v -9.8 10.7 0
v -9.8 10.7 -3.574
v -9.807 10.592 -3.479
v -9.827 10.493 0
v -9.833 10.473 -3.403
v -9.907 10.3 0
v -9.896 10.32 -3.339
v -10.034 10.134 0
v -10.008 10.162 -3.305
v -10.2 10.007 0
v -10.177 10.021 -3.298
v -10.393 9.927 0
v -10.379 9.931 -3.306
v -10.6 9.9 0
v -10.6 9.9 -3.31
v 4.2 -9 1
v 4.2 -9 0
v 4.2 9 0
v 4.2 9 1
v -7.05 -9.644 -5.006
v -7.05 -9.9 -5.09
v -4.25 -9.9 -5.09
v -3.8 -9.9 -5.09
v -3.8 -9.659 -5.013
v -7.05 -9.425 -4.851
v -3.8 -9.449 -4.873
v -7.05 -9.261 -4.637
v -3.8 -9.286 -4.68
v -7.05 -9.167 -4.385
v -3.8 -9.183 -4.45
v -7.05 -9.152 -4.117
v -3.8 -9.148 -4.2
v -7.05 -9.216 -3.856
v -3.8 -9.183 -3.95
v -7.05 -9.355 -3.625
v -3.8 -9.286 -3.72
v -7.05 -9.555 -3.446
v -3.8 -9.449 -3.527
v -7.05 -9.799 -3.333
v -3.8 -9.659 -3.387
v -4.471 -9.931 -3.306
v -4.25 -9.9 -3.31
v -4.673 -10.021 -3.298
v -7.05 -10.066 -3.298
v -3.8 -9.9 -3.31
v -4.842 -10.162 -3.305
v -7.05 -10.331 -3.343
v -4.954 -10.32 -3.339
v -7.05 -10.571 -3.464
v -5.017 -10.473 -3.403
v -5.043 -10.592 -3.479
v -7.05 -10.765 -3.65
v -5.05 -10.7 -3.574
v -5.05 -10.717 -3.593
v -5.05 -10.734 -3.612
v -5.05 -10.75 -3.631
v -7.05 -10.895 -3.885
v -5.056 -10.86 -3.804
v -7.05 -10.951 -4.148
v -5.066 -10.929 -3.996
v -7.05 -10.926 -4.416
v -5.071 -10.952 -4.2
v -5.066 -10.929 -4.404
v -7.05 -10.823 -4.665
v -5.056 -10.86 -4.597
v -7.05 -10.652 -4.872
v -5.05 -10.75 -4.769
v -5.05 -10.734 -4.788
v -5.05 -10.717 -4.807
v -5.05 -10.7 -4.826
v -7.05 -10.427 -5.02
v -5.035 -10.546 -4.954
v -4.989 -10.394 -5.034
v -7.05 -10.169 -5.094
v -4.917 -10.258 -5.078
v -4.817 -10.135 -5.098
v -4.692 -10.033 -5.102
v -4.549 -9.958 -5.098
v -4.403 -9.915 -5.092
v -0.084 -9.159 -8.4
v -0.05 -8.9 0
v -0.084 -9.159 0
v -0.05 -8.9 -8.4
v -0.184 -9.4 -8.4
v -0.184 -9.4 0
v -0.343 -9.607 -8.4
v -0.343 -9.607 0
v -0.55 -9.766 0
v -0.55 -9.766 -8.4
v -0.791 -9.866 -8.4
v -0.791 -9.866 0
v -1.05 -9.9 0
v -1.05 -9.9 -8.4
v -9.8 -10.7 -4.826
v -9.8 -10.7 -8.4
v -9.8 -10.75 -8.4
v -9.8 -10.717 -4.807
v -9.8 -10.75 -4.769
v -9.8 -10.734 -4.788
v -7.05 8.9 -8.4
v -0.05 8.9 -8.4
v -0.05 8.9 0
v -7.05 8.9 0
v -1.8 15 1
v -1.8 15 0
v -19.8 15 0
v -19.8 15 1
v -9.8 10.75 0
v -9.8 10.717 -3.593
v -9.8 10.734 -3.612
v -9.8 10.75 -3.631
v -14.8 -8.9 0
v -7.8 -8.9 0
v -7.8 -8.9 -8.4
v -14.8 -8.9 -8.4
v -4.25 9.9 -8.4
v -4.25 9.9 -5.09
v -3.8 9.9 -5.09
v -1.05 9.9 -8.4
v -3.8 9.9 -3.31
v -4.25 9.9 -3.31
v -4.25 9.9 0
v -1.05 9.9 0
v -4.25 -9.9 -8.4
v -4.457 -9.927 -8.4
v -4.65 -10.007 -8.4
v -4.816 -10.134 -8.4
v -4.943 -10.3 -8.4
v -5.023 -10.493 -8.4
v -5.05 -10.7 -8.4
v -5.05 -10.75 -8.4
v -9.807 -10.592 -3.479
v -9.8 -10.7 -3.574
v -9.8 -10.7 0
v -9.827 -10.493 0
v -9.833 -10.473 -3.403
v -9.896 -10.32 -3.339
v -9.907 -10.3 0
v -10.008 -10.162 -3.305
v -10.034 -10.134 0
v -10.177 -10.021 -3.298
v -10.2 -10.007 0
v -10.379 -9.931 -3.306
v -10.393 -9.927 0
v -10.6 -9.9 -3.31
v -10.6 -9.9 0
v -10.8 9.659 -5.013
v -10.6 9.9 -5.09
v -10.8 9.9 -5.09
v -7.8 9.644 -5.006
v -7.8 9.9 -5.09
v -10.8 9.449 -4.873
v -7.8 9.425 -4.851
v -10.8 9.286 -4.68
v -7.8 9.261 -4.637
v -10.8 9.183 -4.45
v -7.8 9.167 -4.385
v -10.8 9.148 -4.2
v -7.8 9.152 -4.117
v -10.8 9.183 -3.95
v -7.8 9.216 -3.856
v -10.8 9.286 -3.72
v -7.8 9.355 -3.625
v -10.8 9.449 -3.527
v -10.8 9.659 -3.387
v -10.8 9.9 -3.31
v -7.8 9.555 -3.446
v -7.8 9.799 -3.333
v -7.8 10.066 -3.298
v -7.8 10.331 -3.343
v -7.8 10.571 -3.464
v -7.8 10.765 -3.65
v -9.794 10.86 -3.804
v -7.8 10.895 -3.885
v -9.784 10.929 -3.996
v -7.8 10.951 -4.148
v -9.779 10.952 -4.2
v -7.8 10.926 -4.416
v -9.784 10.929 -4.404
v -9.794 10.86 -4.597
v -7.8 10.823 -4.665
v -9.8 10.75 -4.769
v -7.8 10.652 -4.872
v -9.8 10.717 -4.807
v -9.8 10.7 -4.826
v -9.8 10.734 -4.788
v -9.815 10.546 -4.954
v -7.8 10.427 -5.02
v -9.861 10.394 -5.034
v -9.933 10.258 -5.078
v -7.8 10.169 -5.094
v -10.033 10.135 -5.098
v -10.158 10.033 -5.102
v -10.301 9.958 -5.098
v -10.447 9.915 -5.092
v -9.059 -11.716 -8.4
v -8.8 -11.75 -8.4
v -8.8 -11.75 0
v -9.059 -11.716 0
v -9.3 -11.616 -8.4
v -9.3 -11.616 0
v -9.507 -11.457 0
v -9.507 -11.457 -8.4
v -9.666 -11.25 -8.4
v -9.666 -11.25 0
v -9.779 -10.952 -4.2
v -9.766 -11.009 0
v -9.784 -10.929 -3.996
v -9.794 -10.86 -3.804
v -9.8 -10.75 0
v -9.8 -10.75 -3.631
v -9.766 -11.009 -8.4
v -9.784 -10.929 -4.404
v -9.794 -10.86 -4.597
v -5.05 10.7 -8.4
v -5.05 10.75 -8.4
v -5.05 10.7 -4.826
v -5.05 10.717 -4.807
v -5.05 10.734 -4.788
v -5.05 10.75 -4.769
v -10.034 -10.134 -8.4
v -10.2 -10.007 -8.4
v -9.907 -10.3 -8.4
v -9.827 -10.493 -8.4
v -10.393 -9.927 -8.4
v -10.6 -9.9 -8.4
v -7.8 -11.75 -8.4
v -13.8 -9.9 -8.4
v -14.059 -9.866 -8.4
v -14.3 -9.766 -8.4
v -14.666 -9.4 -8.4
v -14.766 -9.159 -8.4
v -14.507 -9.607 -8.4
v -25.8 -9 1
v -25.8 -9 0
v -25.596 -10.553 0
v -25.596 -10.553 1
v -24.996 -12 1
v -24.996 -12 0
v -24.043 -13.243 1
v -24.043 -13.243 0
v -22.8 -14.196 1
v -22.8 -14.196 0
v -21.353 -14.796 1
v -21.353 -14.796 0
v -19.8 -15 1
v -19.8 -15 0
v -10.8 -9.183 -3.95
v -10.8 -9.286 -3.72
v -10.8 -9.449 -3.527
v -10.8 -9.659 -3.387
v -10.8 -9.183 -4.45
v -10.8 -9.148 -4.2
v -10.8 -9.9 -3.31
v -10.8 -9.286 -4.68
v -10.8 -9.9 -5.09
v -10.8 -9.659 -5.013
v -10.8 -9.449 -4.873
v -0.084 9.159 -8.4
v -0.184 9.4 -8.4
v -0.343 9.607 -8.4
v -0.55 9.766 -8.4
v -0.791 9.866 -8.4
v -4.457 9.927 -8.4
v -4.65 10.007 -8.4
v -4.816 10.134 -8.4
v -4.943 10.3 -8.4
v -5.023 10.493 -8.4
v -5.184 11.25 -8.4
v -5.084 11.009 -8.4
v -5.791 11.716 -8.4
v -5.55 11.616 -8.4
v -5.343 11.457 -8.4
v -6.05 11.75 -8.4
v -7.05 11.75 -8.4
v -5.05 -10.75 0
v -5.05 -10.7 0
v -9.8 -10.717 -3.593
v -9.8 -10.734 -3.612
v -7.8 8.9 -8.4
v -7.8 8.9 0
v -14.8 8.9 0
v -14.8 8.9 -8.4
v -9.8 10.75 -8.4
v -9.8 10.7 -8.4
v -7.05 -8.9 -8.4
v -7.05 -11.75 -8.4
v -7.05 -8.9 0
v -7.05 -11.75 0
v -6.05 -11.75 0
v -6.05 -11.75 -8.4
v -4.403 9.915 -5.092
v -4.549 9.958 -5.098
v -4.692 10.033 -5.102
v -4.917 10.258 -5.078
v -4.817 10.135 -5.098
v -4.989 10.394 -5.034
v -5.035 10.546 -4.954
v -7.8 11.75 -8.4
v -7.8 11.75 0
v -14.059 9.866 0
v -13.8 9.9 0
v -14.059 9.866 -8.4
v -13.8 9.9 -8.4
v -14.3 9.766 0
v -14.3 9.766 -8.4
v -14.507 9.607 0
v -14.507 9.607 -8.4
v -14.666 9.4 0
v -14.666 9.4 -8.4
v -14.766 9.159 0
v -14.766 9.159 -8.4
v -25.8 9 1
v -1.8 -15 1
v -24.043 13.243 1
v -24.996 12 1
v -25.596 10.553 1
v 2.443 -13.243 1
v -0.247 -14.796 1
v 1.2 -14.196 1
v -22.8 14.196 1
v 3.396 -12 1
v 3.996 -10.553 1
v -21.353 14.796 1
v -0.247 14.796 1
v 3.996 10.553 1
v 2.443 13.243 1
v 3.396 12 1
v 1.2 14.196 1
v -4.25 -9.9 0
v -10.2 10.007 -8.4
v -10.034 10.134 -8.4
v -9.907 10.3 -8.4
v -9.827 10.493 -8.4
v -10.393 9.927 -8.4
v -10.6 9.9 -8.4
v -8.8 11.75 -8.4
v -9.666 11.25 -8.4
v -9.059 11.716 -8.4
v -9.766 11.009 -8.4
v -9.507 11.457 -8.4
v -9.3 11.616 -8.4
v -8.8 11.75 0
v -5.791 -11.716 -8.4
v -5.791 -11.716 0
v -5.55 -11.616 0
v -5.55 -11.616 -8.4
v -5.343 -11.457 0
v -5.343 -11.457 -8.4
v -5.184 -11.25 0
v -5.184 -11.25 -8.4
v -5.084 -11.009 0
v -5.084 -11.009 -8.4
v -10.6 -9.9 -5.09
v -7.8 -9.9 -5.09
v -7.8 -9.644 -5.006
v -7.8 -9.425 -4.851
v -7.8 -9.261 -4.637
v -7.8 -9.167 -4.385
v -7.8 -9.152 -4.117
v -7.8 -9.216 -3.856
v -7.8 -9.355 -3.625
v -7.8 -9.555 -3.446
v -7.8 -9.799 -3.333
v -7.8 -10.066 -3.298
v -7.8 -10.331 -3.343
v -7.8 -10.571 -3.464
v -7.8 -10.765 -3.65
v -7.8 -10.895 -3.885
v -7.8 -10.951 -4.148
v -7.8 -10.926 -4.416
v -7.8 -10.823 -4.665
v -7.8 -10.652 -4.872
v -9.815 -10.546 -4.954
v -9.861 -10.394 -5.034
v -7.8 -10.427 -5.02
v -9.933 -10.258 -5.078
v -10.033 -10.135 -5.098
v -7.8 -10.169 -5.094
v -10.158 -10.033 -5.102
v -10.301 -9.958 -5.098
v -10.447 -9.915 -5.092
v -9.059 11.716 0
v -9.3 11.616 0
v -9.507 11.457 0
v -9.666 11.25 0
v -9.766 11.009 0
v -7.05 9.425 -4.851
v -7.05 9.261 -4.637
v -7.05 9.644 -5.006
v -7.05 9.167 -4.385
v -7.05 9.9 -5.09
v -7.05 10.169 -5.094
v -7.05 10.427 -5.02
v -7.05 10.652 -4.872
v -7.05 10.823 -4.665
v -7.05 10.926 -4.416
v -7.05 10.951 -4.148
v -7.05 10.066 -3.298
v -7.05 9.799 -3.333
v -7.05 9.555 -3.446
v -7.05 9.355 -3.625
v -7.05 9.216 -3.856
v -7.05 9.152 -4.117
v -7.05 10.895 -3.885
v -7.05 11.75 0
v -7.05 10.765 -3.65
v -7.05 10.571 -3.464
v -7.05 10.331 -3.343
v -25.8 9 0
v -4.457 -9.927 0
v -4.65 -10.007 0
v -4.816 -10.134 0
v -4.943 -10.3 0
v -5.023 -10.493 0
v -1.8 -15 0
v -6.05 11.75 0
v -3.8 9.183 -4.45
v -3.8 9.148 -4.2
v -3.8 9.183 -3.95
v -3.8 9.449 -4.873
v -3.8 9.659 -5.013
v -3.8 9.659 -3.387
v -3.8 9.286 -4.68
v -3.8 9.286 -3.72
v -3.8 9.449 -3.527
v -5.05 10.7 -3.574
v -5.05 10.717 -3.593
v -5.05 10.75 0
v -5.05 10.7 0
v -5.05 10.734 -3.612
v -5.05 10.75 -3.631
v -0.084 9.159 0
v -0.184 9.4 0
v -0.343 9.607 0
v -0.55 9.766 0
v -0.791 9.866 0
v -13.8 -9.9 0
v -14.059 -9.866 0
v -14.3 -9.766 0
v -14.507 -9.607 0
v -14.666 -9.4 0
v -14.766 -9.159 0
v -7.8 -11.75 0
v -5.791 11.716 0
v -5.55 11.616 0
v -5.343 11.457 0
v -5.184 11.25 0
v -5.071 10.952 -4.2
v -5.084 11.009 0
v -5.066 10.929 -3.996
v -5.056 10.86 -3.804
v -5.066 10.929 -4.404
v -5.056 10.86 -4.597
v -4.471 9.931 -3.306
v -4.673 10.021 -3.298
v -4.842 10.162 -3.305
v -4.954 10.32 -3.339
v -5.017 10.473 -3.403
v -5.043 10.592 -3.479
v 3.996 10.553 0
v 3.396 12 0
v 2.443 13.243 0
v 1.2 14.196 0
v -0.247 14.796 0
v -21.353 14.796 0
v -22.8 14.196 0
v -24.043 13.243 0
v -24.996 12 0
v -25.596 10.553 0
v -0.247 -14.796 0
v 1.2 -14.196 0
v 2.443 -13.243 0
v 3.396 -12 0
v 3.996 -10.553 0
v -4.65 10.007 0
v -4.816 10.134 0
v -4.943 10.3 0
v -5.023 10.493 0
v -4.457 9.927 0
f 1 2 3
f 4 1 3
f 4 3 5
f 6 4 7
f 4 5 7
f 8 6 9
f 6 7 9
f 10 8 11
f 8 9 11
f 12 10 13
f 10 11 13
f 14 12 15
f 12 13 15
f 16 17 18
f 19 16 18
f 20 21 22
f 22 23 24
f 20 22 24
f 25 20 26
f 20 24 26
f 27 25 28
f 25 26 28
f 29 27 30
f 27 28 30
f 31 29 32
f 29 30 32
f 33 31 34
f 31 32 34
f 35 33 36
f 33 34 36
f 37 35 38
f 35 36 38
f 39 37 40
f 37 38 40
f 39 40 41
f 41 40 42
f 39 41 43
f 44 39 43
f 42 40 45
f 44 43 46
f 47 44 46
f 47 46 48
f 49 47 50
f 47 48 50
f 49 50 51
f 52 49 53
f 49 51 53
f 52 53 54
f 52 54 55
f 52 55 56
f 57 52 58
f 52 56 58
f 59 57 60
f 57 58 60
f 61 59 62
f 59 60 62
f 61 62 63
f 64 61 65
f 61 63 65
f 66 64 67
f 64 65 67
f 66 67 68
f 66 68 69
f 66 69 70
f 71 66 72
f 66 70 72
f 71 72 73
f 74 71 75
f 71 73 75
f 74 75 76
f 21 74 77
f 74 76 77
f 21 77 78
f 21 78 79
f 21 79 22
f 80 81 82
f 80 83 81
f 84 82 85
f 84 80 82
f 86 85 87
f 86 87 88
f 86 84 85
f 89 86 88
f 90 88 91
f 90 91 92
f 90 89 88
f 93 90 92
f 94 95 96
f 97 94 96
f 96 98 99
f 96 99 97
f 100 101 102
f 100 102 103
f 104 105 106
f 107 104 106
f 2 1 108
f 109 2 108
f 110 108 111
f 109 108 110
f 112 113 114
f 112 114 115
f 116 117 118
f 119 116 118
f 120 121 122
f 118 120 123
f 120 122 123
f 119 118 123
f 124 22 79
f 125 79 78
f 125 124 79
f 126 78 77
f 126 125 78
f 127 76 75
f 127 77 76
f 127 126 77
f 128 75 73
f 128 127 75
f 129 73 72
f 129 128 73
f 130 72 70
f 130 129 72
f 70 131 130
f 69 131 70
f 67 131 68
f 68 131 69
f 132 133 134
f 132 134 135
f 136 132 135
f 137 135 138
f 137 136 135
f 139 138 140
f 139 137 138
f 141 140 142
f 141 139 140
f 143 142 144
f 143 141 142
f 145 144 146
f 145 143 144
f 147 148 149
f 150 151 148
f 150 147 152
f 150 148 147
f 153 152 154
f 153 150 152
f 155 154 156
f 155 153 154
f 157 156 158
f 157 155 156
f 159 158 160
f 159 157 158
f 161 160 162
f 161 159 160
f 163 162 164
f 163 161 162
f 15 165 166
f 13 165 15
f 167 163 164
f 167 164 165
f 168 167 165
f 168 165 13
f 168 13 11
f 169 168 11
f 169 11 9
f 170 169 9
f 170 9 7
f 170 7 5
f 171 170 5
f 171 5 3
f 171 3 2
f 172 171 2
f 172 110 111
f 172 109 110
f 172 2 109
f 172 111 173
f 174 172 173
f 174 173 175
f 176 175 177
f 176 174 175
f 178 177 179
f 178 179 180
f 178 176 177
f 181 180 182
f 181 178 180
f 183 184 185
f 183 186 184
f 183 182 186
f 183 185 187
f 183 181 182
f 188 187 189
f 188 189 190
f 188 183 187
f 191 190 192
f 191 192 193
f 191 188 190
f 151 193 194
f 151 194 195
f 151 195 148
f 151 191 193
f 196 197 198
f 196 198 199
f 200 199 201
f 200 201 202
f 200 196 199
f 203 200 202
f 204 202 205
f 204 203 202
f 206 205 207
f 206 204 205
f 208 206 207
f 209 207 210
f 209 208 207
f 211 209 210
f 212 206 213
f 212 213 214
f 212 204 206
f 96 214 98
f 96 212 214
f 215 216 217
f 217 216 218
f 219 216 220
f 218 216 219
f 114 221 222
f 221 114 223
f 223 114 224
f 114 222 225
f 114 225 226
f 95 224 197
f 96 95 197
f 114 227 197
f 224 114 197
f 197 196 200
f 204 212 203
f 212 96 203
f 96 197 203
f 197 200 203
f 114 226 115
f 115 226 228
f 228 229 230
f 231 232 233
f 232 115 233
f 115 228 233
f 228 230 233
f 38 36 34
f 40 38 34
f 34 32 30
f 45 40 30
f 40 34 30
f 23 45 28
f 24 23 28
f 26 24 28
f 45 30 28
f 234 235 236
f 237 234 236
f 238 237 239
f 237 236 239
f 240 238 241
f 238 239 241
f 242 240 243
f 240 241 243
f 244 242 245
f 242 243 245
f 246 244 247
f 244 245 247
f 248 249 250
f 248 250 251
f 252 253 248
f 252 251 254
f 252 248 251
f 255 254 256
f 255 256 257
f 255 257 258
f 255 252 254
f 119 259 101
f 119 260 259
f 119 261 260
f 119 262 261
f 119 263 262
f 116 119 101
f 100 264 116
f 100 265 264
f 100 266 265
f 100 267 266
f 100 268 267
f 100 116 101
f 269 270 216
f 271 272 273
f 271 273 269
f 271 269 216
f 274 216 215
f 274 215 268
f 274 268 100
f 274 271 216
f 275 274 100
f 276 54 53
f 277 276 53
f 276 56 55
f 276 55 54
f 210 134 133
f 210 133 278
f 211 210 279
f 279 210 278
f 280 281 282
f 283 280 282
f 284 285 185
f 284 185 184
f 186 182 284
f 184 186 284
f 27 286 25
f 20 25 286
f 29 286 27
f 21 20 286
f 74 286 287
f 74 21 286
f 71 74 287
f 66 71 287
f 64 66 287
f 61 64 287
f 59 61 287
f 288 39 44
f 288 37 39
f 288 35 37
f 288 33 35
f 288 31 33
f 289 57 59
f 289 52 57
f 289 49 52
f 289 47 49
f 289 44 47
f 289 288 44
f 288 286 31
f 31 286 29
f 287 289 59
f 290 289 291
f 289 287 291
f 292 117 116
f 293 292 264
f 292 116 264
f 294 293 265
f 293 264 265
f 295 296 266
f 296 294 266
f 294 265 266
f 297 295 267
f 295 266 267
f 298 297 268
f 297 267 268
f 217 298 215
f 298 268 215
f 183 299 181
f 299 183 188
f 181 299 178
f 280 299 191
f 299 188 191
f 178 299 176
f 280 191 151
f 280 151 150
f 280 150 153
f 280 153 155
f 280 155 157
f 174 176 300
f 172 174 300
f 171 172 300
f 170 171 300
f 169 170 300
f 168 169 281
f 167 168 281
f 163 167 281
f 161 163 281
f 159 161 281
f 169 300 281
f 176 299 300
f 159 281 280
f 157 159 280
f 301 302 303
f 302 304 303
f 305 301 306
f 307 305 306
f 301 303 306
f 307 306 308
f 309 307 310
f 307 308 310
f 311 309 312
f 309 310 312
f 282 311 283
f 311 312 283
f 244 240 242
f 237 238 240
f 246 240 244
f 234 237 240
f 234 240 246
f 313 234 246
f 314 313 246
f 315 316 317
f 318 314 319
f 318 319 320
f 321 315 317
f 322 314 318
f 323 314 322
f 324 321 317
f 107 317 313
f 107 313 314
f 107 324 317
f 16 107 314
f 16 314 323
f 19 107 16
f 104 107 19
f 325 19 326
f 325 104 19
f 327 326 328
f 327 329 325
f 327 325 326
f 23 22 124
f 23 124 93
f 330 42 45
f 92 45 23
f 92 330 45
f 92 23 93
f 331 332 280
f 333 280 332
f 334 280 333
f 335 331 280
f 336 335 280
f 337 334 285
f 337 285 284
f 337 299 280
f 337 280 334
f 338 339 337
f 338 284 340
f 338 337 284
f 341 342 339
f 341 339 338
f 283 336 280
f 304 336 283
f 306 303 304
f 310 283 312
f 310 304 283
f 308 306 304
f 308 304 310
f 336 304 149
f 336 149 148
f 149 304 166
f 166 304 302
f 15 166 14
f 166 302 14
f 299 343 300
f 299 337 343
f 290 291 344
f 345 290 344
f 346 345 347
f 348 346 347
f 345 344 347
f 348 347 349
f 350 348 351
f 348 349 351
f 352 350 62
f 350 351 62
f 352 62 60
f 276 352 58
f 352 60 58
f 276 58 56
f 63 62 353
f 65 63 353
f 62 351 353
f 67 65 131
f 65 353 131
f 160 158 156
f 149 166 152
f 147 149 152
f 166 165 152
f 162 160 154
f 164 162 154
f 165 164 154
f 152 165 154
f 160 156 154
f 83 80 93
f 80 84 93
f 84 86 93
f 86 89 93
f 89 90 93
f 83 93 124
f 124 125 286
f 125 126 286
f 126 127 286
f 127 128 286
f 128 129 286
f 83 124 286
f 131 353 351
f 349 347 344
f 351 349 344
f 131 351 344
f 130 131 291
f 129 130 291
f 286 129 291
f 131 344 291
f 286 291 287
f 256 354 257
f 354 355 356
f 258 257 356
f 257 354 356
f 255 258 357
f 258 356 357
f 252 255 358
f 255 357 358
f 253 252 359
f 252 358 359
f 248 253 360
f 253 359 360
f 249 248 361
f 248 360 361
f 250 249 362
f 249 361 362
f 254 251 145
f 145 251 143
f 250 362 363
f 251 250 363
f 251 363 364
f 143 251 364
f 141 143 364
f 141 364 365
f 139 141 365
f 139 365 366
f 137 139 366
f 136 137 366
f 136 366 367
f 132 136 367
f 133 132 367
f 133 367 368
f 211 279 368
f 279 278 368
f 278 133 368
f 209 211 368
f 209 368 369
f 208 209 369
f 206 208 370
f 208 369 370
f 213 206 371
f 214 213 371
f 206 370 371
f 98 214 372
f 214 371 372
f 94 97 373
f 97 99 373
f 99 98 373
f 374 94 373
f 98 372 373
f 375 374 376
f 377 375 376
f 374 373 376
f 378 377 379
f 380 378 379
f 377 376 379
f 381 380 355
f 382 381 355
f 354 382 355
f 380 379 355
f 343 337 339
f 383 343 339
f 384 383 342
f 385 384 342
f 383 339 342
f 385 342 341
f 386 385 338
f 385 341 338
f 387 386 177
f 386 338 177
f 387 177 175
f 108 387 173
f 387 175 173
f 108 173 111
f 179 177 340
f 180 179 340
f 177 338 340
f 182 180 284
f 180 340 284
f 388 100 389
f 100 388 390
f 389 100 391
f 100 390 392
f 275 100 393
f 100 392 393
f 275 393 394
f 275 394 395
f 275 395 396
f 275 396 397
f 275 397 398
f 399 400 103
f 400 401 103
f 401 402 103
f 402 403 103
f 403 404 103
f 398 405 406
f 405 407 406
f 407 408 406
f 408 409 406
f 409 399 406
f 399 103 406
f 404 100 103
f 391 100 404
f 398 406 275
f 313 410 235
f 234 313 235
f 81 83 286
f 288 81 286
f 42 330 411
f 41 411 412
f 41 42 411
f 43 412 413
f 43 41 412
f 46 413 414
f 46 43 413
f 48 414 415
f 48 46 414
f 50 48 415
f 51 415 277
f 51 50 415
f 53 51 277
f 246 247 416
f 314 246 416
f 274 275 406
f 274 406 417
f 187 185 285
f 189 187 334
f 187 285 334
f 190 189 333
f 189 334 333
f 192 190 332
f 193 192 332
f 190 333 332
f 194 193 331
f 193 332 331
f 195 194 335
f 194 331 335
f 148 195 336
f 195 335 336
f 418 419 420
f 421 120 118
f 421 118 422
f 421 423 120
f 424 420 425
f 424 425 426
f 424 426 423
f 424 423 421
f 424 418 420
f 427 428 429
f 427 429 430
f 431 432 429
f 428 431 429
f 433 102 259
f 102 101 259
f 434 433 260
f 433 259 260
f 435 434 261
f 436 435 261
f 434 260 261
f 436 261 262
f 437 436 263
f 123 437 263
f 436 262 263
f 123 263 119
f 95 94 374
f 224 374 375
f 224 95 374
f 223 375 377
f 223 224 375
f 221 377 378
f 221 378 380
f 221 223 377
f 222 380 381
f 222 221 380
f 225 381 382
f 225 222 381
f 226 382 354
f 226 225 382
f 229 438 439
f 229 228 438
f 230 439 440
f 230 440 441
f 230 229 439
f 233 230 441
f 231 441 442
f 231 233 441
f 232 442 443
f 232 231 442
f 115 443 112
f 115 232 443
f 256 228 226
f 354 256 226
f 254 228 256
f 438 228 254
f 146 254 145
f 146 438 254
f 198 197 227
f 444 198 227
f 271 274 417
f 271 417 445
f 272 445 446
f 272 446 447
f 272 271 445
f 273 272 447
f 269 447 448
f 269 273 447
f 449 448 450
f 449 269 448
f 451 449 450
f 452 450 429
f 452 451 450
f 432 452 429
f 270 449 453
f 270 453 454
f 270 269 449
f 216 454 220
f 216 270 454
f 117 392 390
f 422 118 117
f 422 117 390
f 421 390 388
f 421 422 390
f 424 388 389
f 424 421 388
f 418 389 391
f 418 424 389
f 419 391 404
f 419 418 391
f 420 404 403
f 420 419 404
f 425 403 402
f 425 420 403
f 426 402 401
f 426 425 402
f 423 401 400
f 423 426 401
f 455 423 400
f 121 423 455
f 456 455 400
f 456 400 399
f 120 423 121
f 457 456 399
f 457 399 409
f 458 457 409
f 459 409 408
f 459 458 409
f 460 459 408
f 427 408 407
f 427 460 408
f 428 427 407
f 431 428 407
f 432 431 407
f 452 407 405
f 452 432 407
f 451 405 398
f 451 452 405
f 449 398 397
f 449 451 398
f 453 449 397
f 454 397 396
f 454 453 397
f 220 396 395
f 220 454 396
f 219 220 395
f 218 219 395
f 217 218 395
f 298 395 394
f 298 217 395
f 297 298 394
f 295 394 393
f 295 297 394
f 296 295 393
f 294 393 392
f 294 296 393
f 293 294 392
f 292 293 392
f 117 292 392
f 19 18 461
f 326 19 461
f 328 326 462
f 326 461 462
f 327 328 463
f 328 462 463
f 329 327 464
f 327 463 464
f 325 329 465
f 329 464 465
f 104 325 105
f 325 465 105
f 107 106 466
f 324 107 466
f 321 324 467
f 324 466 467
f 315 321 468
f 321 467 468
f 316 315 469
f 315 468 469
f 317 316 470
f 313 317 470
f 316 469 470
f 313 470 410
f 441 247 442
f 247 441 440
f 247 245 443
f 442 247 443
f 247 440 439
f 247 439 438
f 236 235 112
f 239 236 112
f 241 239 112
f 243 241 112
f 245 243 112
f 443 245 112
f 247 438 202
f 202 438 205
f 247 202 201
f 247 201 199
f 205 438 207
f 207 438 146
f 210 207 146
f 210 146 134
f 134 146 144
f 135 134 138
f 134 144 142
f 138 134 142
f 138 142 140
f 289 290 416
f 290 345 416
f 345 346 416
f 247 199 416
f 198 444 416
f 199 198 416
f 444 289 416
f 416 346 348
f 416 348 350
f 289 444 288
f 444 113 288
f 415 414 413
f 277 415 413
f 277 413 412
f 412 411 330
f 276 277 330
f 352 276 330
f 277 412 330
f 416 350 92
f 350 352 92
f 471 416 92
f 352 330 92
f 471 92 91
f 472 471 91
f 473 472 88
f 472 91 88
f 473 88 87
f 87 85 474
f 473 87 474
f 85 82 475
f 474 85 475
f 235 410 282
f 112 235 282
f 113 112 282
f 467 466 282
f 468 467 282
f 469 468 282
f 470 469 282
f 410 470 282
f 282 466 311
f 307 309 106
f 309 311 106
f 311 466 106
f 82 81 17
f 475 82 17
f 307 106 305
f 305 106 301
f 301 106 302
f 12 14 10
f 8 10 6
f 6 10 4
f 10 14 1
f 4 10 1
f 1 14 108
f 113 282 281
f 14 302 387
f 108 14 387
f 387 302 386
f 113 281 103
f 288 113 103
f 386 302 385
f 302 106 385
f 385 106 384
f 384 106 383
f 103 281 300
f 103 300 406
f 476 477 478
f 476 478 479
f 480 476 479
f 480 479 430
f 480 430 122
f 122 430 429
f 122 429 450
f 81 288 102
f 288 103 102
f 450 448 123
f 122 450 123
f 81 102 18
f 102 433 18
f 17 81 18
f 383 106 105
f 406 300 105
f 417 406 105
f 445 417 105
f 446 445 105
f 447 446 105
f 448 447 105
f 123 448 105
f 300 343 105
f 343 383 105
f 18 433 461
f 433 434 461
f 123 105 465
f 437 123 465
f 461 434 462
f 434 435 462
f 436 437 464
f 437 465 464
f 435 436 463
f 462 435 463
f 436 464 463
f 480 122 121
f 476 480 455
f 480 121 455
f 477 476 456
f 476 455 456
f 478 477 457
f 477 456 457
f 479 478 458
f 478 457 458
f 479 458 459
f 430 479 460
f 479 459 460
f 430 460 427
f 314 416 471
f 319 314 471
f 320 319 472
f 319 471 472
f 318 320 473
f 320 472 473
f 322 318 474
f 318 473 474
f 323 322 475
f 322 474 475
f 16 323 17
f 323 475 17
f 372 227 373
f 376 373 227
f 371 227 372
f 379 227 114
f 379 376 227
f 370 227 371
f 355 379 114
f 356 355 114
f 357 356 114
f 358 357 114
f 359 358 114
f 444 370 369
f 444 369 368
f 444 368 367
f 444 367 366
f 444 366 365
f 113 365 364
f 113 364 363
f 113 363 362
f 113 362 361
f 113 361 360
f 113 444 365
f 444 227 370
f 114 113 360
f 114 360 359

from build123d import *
from OCP.BRepFilletAPI import BRepFilletAPI_MakeFillet

# Parameters (mm, degrees)
SKETCH1_W           = 8.4
SKETCH1_H           = 23.5
BOSS_EXTRUDE1_DEPTH = 1
SKETCH1_3_W         = 11.6
SKETCH1_3_H         = 23.5
BOSS_EXTRUDE4_DEPTH = 1
BOSS_EXTRUDE5_START = -1
BOSS_EXTRUDE5_DEPTH = 9.4
FILLET2_R           = 1
FILLET2_R_2         = 0.8
FILLET3_R           = 5
CUT_EXTRUDE1_START  = -6
SKETCH4_R           = 0.902238409
CUT_EXTRUDE1_DEPTH  = 7
BOSS_EXTRUDE8_DEPTH = 1


# Read off the part's stored shape, not the designer's step: Mirror1
with BuildPart() as part:
    # Sketch1 → Boss-Extrude1 (new body)
    with BuildSketch(Plane.XY):
        Rectangle(SKETCH1_W, SKETCH1_H)
    extrude(amount=BOSS_EXTRUDE1_DEPTH)

    # Sketch1<3> → Boss-Extrude4 (add)
    with BuildSketch(Plane.XY):
        with Locations((-10, 0)):
            Rectangle(SKETCH1_3_W, SKETCH1_3_H)
    extrude(amount=BOSS_EXTRUDE4_DEPTH)

    # Sketch3 → Boss-Extrude5 (add)
    with BuildSketch(Plane(origin=(0, 0, 0), x_dir=(-1, 0, 0), z_dir=(0, 0, -1)).offset(BOSS_EXTRUDE5_START)):
        Polygon((0.05, 8.9), (7.05, 8.9), (7.05, 11.75), (5.05, 11.75), (5.05, 9.9), (0.05, 9.9), align=None)
        Polygon((7.8, 11.75), (7.8, 8.9), (14.8, 8.9), (14.8, 9.9), (9.8, 9.9), (9.8, 11.75), align=None)
    extrude(amount=BOSS_EXTRUDE5_DEPTH)

    # Fillet2
    fillet2_edges_1 = [part.edges().sort_by_distance(p)[0] for p in [
        (-9.8, 11.75, -4.2),
        (-5.05, 11.75, -4.2),
        (-0.05, 9.9, -4.2),
        (-14.8, 9.9, -4.2),
    ]]
    fillet2_edges_2 = [part.edges().sort_by_distance(p)[0] for p in [
        (-9.8, 9.9, -4.2),
        (-5.05, 9.9, -4.2),
    ]]
    fillet2 = BRepFilletAPI_MakeFillet(part.part.solid().wrapped)
    for e in fillet2_edges_1:
        fillet2.Add(FILLET2_R - 0.0001, e.wrapped)
    for e in fillet2_edges_2:
        fillet2.Add(FILLET2_R_2 - 0.0001, e.wrapped)
    add(Compound.cast(fillet2.Shape()), mode=Mode.REPLACE)  # a hair under: the kernel refuses the full size

    # Fillet3
    fillet3_edges = [part.edges().sort_by_distance(p)[0] for p in [
        (-15.8, 11.75, 0.5),
        (-15.8, -11.75, 0.5),
        (4.2, -11.75, 0.5),
        (4.2, 11.75, 0.5),
    ]]
    fillet(fillet3_edges, radius=FILLET3_R)

    # Sketch4 → Cut-Extrude1 (cut)
    with BuildSketch(Plane.ZY.offset(9.8).offset(CUT_EXTRUDE1_START)):
        with Locations(Location((-4.2, 10.05, 0), (0, 0, 189.57004168))):
            Circle(SKETCH4_R)
    extrude(amount=CUT_EXTRUDE1_DEPTH, mode=Mode.SUBTRACT)

    # Mirror1: part across plane


with BuildPart() as part_1:
    add(part.part)
    add(part.part.mirror(Plane.ZX))

    # Sketch7 → Boss-Extrude8 (add)
    with BuildSketch(Plane.XY):
        with BuildLine():
            Line((-1.8, 15), (-19.8, 15))
            ThreePointArc((-19.8, 15), (-24.042640687, 13.242640687), (-25.8, 9))
            Line((-25.8, 9), (-25.8, -9))
            ThreePointArc((-25.8, -9), (-24.042640687, -13.242640687), (-19.8, -15))
            Line((-19.8, -15), (-1.8, -15))
            ThreePointArc((-1.8, -15), (2.442640687, -13.242640687), (4.2, -9))
            Line((4.2, -9), (4.2, 9))
            ThreePointArc((4.2, 9), (2.442640687, 13.242640687), (-1.8, 15))
        make_face()
    extrude(amount=BOSS_EXTRUDE8_DEPTH)


solid = part_1.part
